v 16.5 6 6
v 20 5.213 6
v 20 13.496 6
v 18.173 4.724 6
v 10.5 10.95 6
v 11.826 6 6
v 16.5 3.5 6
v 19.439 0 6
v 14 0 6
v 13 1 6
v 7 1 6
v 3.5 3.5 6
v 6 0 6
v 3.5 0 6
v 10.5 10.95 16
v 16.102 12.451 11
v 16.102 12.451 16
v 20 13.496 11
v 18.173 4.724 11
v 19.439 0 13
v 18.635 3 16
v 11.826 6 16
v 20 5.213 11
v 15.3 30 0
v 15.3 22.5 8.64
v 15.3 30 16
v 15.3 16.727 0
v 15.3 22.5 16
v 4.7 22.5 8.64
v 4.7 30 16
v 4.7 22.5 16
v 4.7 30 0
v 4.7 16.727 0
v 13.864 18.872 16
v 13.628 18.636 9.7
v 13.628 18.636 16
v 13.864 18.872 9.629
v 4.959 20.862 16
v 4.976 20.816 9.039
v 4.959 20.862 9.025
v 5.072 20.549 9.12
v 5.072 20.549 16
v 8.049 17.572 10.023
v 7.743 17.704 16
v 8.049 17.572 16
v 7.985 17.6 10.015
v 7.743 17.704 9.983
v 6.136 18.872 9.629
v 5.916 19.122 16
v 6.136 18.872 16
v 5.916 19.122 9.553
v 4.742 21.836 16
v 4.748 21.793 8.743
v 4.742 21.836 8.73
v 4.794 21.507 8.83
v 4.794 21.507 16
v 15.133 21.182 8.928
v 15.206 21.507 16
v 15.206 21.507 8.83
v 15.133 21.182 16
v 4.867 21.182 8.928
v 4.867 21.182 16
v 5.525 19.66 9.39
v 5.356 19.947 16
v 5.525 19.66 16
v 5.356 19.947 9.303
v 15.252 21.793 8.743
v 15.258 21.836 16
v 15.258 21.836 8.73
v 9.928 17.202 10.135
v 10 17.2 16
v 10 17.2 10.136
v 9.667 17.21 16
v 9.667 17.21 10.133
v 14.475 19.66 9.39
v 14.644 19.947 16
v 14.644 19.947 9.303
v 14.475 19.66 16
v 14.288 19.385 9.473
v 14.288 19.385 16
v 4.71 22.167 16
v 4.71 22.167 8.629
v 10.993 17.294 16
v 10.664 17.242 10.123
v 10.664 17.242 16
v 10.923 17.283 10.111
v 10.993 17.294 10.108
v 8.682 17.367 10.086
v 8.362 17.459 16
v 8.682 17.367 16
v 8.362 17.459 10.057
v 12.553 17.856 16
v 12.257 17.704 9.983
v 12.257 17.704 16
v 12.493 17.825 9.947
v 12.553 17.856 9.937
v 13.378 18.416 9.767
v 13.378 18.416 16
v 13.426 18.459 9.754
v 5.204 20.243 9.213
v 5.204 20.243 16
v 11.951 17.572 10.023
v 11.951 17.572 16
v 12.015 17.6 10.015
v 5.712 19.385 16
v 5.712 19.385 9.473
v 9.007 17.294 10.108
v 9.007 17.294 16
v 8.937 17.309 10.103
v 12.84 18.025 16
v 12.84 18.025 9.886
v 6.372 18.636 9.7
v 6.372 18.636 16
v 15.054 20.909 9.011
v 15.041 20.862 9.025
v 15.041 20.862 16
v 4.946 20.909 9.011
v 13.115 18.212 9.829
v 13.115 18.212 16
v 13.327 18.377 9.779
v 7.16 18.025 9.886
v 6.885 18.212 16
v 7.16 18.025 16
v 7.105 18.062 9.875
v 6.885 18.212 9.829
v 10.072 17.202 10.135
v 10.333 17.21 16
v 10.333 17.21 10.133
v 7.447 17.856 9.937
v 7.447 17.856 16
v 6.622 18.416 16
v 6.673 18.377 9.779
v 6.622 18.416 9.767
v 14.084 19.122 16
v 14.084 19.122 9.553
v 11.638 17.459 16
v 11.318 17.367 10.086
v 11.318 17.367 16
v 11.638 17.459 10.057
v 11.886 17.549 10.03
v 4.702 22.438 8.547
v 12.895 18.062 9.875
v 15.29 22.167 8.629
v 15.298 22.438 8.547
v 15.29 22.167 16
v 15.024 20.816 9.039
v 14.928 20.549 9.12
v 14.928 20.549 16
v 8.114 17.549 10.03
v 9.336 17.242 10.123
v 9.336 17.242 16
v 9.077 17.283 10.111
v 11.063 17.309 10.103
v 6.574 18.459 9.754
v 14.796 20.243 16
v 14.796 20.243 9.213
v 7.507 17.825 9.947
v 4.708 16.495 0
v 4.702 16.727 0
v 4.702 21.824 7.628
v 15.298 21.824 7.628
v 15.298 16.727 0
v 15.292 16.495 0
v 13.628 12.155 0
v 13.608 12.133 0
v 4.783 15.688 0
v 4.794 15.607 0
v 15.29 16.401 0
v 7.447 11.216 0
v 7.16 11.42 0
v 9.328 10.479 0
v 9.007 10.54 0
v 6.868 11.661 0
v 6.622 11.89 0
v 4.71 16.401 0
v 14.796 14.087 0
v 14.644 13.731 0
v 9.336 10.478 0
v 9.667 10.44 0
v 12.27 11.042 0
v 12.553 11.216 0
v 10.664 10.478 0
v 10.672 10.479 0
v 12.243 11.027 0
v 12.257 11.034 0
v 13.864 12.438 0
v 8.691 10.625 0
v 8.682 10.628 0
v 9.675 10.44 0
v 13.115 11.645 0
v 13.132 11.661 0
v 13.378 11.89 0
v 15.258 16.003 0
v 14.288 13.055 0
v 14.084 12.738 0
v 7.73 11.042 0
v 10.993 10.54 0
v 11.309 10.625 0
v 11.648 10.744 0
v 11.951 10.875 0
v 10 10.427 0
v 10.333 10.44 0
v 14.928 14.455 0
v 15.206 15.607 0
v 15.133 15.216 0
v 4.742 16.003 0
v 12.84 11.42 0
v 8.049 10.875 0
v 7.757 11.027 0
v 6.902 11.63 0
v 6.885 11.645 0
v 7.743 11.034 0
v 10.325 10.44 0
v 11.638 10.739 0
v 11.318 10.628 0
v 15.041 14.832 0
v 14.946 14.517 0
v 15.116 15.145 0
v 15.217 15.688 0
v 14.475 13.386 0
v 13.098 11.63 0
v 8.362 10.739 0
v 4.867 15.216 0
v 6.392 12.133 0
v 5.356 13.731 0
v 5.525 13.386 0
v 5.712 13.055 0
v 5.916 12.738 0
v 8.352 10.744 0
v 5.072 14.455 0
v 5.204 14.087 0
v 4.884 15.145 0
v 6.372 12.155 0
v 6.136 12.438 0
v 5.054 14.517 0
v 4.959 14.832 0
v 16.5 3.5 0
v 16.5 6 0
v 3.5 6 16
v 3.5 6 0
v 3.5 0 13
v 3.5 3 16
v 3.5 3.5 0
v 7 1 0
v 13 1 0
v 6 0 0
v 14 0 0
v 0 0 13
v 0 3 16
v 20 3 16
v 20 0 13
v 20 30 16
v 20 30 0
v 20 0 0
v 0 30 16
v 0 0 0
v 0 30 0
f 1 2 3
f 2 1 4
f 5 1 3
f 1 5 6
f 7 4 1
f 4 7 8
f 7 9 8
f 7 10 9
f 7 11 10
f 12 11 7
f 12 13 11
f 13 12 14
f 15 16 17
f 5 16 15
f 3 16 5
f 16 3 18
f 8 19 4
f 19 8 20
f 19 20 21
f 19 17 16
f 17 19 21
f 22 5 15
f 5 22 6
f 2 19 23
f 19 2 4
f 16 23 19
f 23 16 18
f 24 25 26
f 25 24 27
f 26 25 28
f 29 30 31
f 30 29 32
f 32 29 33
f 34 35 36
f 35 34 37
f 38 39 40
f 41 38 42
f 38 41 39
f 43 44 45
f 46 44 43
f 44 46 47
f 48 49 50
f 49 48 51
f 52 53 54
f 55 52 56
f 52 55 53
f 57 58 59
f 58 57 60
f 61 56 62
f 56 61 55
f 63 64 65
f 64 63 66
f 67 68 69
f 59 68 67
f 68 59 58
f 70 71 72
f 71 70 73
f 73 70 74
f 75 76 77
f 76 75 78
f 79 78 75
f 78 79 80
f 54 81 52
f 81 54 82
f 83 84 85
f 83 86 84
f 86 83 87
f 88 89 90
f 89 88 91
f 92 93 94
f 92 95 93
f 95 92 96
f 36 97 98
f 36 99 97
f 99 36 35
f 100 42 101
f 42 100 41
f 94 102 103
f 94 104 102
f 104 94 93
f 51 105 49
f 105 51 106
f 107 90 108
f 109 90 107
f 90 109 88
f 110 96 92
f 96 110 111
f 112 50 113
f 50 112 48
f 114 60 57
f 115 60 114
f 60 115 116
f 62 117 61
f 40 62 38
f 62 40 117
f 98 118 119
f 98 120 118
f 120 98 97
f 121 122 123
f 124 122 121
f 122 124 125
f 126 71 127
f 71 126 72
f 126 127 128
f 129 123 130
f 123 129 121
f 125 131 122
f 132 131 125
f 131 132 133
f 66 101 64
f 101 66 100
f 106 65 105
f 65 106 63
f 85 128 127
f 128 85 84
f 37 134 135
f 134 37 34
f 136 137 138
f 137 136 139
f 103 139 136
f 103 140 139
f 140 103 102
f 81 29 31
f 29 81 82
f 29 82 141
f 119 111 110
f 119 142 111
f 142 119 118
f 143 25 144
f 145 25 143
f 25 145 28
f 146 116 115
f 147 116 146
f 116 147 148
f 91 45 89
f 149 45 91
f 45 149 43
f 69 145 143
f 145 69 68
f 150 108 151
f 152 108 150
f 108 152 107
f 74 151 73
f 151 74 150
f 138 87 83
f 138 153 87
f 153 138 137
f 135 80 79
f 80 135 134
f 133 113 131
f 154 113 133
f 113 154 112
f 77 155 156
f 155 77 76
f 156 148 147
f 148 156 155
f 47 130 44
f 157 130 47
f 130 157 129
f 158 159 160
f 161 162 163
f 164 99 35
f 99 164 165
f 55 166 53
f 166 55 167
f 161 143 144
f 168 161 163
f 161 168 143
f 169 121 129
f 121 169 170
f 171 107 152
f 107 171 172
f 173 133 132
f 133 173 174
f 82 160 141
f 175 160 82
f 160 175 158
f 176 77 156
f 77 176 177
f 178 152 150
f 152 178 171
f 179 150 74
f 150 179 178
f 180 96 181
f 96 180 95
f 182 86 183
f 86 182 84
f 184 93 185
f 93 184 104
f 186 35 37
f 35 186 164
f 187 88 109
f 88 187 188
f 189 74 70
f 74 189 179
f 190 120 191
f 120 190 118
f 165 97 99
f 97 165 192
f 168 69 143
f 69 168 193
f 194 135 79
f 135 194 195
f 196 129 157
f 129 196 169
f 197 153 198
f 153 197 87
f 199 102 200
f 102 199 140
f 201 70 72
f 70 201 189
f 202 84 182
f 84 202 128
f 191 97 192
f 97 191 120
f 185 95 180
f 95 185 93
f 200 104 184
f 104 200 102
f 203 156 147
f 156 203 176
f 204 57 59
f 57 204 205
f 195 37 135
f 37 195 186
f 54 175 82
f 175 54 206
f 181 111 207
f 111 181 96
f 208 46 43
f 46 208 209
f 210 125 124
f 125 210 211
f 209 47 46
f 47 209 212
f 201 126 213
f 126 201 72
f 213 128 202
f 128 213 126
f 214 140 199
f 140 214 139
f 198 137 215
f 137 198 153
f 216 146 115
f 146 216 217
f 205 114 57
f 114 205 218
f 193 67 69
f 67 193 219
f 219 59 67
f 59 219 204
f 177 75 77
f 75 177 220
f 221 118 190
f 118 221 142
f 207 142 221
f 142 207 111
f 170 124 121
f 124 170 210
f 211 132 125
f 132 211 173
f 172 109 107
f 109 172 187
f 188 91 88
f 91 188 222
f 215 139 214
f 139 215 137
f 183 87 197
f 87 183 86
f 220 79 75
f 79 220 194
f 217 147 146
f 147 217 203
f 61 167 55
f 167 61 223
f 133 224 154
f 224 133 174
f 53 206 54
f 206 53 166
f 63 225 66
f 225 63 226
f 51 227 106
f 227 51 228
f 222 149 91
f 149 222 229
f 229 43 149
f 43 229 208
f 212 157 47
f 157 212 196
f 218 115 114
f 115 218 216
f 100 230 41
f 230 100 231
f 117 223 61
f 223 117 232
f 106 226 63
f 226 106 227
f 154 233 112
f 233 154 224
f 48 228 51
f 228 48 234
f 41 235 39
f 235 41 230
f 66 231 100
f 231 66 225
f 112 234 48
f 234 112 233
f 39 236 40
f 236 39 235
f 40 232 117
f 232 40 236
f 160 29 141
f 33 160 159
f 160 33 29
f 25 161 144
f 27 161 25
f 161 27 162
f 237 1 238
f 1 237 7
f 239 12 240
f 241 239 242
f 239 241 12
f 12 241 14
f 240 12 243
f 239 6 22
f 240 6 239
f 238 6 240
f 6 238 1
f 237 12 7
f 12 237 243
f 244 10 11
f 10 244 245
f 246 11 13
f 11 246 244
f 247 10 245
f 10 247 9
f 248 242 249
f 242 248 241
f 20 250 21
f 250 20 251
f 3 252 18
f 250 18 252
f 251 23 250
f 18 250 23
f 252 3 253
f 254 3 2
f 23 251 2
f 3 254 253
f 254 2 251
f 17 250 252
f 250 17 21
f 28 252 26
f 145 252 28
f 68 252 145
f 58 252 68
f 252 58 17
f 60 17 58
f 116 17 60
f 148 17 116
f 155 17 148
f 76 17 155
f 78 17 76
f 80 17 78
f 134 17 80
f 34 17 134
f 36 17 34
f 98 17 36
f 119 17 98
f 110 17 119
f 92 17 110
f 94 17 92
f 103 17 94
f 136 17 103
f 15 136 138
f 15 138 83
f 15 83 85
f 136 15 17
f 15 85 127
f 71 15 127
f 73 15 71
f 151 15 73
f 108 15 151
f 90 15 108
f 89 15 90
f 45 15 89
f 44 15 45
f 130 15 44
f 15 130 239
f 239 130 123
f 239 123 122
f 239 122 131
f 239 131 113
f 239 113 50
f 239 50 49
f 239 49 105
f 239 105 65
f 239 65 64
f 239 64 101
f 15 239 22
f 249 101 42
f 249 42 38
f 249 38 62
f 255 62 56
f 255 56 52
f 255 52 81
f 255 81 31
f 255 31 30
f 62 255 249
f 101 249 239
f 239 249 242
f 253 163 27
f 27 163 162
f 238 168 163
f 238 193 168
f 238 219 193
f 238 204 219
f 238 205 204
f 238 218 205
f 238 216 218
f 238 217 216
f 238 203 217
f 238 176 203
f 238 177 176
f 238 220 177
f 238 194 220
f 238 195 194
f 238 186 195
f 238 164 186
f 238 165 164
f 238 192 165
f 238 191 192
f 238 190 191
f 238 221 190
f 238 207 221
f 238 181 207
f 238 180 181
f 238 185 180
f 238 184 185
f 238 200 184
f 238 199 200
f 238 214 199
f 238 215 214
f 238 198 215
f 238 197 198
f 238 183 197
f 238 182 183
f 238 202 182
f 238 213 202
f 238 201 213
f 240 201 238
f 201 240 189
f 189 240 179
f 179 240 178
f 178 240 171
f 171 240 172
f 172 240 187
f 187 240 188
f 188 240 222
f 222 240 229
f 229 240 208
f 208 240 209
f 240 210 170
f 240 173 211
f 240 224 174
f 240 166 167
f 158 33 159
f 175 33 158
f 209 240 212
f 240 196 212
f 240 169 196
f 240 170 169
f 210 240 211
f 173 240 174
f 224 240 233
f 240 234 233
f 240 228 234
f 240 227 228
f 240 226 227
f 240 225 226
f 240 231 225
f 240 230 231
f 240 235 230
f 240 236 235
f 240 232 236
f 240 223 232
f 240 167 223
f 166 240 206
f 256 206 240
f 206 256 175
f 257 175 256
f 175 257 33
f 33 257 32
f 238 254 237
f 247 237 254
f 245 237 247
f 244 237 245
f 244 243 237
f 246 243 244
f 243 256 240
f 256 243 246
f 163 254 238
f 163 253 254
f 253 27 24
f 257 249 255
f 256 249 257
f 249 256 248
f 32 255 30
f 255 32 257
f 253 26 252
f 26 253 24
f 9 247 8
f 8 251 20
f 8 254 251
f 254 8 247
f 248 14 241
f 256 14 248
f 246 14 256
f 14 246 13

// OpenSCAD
// Created Code_Ycorner_Endstop.stl
// https://github.com/Mecan0/Code
// By J.Rodigo (www.jra.so)
// Licence Creative commons atribution & share alike.

// Pieza y las operaciones
difference () {
		translate([0, 0, 0])
		cube([20, 30, 16]);	
	union() {
		// Zona Cilindrica
		translate([4.7, 22.5, -1])
		cube([10.6, 8, 18]);

		translate([10, 22.5, -1])
		rotate( 90, [0, 0, 1])
		cylinder(h = 18, r = 5.3, $fn=100);

		translate([10, 19.08, 3.41])
		rotate(-33.75, [1,0,0])
		cylinder(h = 16, r = 5.3, center=true , $fn=100);
		translate([10, 25.38, 3.41])
		rotate(-33.75, [1,0,0])
		cube([10.6, 10.6, 18], center=true);

		// Zona plana
		translate([3.5, 3.5, -1])
		cube([13, 2.5, 8]);

		translate([7, -1, -1])
		cube([6, 2, 8]);

		translate([7, 1, -1])
		rotate(225, [0,0,1])
		cube([2, 2, 8]);

		translate([13, 1, -1])
		rotate(225, [0,0,1])
		cube([2, 2, 8]);

		translate([-1, 0, 13])
		rotate(45, [1,0,0])
		cube([22, 5, 5]);

		translate([3.5, -1, 6])
		cube([13, 7, 11]);

		translate([10.5, 10.95, 6])
		rotate(285, [0,0,1])
		union() {
			cube([14, 5.8, 11]);
			cube([8, 10, 5]);
		}
	}	
}
